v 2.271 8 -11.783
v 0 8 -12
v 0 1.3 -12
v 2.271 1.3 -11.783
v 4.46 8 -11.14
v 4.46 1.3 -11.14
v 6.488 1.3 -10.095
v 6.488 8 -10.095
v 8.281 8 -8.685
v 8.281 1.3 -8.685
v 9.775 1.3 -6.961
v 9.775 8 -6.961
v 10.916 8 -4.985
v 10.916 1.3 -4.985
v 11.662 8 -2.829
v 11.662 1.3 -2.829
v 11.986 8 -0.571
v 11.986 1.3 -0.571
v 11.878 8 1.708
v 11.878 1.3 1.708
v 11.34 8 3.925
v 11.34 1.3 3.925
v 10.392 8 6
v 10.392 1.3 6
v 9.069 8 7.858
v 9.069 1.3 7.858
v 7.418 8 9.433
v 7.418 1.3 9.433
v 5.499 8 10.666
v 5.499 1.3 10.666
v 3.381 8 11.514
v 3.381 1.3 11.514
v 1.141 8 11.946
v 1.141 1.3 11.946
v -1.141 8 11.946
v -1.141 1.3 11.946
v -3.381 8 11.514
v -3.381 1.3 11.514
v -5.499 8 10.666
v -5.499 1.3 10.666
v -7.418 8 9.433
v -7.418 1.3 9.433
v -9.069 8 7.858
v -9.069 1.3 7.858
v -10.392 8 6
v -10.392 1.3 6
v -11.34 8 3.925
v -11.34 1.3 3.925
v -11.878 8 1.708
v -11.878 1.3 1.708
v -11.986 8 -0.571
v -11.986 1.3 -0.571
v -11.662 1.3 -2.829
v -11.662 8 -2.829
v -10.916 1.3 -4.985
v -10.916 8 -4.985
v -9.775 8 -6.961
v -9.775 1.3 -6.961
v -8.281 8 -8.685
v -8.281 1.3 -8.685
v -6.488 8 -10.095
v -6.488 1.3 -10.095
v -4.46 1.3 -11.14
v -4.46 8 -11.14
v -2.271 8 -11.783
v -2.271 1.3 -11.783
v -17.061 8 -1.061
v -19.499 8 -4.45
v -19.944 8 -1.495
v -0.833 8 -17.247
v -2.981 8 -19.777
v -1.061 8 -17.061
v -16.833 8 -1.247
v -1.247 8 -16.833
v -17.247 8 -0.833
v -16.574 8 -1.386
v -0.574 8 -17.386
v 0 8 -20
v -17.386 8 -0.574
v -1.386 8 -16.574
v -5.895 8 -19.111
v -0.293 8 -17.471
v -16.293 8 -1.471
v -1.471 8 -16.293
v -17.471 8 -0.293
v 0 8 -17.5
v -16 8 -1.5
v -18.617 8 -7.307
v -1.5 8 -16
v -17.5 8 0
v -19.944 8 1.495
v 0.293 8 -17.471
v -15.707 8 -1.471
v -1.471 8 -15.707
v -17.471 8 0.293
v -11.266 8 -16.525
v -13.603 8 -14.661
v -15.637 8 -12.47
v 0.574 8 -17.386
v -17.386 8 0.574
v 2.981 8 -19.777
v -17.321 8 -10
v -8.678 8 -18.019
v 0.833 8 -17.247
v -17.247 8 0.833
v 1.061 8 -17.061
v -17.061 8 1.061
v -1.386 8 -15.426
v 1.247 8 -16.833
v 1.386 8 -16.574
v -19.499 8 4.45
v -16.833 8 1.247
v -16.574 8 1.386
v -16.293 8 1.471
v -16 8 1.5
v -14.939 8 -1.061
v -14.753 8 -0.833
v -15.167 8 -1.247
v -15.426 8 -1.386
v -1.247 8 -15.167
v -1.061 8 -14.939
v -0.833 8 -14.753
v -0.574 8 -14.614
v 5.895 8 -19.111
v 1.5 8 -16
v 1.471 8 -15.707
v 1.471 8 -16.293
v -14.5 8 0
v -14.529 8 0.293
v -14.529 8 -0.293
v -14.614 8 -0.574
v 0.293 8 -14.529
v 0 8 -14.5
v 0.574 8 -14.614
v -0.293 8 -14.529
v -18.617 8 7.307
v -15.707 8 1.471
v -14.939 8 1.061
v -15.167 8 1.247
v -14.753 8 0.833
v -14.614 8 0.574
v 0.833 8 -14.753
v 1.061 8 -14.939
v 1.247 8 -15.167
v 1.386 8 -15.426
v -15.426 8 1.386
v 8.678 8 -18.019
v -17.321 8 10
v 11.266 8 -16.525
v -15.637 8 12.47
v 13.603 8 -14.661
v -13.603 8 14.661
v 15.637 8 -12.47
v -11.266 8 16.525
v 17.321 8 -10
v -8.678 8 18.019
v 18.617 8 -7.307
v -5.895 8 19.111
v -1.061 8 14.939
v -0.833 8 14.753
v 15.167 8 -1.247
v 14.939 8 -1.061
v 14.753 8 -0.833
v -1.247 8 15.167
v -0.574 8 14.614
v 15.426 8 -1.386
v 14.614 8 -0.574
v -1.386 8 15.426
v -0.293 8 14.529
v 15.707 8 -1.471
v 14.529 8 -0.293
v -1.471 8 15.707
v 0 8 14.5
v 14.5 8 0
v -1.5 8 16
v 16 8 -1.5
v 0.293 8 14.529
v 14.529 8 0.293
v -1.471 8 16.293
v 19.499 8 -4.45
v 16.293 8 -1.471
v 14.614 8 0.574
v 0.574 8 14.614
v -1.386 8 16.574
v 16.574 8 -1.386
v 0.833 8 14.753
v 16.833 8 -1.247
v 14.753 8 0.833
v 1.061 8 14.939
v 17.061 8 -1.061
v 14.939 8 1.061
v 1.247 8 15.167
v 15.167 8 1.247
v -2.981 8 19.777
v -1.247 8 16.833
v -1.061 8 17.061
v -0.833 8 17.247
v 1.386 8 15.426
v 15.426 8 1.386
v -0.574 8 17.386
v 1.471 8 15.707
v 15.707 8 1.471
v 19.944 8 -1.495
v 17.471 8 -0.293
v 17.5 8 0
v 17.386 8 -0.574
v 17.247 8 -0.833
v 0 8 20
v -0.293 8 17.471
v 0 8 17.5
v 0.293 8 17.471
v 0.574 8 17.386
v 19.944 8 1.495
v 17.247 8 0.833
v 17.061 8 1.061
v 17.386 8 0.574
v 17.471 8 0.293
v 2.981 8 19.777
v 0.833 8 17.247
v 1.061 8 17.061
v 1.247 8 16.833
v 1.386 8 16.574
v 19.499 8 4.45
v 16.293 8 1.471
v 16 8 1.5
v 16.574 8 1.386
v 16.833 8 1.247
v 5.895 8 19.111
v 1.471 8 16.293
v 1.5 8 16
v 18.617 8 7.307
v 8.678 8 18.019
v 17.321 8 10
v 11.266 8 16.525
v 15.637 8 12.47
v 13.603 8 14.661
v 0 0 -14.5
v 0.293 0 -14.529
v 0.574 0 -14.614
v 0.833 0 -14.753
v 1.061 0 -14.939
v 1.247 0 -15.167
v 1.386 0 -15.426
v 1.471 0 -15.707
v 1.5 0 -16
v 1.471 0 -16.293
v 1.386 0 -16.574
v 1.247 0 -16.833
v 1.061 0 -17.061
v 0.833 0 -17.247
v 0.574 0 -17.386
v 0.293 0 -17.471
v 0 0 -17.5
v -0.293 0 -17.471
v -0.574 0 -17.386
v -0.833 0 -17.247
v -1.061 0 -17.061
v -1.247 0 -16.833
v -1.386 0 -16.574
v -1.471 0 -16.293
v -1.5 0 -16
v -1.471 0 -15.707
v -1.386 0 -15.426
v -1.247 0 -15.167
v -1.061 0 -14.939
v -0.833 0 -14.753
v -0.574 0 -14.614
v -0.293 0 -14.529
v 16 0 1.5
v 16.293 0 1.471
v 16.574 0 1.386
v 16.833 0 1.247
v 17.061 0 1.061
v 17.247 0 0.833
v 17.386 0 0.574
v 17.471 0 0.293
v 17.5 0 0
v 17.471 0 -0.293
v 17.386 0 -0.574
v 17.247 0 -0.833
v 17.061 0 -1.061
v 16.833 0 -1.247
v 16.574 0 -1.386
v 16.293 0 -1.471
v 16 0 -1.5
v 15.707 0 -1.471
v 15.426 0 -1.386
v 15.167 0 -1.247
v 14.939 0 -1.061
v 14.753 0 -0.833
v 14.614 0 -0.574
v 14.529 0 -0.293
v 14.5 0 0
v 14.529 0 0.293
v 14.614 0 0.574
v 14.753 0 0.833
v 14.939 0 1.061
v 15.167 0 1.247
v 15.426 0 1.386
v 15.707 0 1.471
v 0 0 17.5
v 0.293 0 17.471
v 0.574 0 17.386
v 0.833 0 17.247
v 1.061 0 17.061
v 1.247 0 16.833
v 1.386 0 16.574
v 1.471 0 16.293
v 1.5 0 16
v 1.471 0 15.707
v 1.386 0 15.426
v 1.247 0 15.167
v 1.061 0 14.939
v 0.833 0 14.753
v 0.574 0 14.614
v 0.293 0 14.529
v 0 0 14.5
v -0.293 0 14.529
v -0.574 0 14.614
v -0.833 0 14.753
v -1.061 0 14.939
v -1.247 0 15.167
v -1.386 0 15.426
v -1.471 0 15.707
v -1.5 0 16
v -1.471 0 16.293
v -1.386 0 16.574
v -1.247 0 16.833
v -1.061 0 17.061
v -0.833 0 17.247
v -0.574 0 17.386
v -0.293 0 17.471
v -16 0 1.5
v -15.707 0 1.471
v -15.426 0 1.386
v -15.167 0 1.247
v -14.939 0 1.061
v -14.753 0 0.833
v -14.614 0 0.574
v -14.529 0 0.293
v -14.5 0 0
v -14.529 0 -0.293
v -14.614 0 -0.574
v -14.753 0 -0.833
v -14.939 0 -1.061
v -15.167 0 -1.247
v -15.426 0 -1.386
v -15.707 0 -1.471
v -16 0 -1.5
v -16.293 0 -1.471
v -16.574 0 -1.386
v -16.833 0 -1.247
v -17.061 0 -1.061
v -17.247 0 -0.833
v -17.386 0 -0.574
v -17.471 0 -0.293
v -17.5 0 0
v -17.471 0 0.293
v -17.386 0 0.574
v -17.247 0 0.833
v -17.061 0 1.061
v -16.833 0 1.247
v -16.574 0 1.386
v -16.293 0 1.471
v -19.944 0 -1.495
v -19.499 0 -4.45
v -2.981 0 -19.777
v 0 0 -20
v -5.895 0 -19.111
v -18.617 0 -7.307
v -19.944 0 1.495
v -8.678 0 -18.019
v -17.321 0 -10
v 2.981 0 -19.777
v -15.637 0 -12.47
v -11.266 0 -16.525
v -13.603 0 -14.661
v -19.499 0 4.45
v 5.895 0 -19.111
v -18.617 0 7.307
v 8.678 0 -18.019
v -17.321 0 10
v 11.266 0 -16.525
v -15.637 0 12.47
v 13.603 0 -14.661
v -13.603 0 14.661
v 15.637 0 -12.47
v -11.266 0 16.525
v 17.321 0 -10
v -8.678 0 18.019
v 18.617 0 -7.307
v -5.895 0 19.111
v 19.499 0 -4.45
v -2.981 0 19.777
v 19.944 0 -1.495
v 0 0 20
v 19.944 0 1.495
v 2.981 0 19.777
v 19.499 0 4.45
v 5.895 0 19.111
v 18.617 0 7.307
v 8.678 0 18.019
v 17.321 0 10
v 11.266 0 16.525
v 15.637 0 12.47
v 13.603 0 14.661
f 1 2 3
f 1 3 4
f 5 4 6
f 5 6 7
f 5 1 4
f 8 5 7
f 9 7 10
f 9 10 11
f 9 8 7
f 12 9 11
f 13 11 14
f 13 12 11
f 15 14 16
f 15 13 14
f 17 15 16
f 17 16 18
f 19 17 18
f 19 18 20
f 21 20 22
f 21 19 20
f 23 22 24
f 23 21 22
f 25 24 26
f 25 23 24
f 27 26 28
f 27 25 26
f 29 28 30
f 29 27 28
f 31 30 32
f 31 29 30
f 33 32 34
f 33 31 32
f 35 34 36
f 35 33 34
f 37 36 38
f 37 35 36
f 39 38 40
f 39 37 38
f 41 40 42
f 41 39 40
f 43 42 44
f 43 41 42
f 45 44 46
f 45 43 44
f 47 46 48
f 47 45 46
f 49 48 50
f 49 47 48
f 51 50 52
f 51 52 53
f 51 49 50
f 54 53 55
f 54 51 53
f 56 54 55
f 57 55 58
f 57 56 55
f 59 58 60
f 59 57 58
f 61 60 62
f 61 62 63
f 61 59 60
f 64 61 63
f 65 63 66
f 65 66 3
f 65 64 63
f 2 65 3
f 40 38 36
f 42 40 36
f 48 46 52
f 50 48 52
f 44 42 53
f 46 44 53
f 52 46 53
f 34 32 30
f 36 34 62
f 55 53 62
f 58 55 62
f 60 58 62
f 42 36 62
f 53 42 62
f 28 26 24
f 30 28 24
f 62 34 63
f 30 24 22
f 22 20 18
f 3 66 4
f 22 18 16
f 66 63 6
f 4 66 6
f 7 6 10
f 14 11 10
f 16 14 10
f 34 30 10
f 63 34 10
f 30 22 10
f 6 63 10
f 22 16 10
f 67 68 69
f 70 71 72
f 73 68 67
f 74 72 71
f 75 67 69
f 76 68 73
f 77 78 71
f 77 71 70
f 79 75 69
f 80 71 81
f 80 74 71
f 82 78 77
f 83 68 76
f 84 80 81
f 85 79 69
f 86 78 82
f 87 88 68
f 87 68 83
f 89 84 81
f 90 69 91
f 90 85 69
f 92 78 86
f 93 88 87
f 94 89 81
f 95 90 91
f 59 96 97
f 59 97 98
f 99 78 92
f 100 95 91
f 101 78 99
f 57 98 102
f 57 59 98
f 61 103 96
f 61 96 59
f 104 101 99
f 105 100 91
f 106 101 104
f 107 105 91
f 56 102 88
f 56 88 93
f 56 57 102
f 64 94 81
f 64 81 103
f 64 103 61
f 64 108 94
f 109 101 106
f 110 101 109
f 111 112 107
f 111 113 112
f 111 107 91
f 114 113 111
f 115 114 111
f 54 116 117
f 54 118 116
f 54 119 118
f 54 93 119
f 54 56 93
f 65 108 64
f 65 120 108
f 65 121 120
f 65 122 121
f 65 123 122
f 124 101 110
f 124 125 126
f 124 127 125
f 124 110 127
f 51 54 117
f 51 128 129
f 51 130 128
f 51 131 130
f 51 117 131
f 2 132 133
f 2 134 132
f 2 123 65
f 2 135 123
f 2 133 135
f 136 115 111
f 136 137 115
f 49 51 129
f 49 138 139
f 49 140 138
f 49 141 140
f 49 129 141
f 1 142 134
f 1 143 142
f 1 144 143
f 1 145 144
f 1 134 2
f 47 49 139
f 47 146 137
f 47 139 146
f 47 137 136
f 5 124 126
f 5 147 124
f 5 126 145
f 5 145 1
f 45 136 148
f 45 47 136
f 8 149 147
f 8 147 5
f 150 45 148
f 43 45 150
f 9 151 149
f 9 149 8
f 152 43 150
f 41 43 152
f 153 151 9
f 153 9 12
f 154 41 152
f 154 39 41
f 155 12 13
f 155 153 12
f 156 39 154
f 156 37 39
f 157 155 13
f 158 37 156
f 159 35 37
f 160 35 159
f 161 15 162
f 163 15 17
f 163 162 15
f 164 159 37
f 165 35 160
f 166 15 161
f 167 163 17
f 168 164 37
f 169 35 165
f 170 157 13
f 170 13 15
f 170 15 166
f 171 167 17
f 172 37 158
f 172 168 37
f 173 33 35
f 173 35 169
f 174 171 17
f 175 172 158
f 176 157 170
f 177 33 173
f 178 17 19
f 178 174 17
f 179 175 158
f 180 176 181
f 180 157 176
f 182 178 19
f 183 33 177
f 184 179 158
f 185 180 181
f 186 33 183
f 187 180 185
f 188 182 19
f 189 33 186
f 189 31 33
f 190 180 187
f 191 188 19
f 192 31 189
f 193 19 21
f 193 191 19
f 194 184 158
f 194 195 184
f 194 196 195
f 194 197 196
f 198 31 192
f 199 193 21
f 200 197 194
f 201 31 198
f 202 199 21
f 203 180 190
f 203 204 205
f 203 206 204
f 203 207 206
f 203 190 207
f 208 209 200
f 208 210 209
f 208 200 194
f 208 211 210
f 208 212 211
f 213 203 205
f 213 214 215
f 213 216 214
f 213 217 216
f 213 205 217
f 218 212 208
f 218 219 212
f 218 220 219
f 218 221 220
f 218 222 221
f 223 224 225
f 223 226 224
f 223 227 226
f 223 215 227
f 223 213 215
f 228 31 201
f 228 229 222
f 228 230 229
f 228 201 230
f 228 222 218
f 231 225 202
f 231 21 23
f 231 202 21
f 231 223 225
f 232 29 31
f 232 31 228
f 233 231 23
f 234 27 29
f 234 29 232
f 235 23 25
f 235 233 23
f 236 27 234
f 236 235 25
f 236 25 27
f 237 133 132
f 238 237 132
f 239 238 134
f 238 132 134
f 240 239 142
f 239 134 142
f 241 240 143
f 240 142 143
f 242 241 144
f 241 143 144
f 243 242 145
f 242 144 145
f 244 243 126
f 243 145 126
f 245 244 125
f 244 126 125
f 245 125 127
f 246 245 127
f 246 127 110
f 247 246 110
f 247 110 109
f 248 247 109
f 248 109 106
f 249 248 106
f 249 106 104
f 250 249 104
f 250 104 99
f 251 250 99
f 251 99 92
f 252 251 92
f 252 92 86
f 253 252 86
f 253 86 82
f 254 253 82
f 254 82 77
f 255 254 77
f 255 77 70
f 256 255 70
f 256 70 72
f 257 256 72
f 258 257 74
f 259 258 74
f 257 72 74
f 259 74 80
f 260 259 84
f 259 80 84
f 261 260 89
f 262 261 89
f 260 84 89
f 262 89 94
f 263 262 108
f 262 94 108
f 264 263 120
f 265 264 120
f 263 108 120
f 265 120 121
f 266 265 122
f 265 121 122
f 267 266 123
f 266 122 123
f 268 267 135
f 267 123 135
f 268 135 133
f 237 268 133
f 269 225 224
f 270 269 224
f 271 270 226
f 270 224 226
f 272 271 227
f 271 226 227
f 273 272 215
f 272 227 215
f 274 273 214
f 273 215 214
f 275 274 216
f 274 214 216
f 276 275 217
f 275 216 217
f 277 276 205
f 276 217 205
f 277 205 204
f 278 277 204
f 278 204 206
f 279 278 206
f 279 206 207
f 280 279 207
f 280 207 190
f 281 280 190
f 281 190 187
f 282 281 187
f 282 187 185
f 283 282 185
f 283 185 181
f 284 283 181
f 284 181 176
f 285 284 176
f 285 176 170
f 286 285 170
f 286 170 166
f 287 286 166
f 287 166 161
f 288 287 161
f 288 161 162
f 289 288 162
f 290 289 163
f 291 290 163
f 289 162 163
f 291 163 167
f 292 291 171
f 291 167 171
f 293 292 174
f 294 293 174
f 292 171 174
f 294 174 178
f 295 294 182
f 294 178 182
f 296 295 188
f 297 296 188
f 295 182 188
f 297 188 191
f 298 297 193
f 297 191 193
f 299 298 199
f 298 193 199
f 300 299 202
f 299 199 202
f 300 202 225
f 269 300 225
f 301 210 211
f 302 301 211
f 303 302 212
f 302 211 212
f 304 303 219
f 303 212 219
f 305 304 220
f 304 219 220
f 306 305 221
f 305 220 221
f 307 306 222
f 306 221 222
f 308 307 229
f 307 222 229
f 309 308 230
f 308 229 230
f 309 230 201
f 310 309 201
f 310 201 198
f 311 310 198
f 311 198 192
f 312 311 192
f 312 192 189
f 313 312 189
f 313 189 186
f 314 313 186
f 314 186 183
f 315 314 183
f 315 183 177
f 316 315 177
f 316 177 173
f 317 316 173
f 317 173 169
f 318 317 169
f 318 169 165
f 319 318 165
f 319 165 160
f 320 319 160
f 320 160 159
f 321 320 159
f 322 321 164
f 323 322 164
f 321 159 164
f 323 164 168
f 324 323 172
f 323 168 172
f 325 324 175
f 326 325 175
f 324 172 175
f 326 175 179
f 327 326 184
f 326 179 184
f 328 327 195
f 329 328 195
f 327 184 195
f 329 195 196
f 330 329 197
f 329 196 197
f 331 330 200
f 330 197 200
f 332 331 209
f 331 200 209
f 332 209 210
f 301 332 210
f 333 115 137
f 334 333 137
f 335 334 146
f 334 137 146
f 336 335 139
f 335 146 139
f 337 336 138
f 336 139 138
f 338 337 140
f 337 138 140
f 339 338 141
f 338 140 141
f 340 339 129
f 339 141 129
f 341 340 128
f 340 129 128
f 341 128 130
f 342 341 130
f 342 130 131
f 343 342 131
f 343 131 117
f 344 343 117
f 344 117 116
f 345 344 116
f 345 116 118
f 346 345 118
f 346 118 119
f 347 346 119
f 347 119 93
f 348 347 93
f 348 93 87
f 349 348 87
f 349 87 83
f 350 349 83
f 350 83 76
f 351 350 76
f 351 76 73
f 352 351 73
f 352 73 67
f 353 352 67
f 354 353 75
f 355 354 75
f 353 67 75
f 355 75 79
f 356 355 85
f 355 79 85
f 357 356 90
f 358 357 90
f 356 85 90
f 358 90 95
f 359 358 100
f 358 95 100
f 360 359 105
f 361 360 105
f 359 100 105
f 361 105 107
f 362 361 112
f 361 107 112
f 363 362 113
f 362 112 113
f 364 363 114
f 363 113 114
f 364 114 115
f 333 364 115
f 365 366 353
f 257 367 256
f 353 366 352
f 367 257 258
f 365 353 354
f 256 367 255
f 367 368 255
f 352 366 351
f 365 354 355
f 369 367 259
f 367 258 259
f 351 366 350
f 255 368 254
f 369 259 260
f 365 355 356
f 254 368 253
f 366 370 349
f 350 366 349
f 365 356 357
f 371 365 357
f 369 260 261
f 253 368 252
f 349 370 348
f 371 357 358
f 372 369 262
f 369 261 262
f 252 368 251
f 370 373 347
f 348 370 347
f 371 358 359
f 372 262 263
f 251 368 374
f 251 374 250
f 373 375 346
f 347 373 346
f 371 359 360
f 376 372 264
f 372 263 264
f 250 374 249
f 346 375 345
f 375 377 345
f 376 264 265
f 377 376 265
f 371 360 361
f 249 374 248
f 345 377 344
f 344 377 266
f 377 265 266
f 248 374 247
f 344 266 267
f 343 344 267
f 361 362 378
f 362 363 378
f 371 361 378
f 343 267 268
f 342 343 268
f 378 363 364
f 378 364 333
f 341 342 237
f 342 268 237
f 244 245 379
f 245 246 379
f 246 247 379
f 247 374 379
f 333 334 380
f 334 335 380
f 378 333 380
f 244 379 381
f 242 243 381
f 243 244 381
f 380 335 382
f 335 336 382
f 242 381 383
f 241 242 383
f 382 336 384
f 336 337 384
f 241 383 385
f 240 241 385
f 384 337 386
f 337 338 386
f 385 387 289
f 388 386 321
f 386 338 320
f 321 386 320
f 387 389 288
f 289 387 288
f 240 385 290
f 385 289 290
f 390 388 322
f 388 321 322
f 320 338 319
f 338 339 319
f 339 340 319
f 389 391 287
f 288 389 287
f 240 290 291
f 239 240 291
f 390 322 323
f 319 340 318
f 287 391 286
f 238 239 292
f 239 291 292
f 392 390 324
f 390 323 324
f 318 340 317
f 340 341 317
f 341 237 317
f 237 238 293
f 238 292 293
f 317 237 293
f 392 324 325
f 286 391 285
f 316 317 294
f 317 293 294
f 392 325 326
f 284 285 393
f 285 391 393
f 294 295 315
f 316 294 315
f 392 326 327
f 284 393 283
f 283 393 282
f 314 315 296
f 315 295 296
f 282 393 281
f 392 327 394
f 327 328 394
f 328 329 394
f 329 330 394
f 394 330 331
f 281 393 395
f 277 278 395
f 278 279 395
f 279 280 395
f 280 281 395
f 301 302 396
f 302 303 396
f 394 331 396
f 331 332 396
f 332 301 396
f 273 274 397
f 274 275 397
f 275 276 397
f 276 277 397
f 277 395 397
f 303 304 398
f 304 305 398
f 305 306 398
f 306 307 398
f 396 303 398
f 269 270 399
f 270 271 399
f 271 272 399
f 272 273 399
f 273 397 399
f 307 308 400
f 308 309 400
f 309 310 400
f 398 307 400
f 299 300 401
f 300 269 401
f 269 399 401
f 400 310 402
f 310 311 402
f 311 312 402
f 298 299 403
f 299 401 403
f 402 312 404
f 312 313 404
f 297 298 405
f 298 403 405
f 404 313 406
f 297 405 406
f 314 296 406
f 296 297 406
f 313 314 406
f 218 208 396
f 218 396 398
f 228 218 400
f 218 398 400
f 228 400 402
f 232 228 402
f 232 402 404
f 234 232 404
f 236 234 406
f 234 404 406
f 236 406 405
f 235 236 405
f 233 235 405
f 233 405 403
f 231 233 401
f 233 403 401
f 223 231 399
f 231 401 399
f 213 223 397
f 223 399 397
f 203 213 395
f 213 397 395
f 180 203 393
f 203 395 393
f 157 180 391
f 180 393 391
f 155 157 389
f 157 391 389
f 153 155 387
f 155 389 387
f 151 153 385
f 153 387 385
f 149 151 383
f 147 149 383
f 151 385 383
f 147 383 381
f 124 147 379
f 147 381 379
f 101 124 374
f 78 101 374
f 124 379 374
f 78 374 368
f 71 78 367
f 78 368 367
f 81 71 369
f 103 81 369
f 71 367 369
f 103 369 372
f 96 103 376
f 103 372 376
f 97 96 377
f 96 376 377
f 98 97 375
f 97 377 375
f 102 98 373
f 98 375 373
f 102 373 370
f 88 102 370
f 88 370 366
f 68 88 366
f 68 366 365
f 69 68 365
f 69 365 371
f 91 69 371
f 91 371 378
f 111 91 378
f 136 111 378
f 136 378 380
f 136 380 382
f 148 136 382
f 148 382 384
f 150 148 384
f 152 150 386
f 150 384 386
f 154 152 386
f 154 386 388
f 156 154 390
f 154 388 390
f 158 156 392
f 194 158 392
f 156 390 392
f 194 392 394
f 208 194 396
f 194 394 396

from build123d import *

# Parameters (mm, degrees)
SKETCH2_R           = 20
BOSS_EXTRUDE1_DEPTH = 8
SKETCH3_R           = 1.5
CUT_EXTRUDE1_DEPTH  = 30.393876913
SKETCH4_R           = 12
CUT_EXTRUDE2_DEPTH  = 6.7


with BuildPart() as part:
    # Sketch2 → Boss-Extrude1 (new body)
    with BuildSketch(Plane(origin=(0, 0, 0), x_dir=(1, 0, 0), z_dir=(0, 1, 0))):
        with Locations(Location((0, 0, 0), (0, 0, 270))):
            Circle(SKETCH2_R)
    extrude(amount=BOSS_EXTRUDE1_DEPTH)

    # Sketch3 → Cut-Extrude1 (cut, through all)
    with BuildSketch(Plane(origin=(0, 8, 0), x_dir=(1, 0, 0), z_dir=(0, 1, 0))):
        with Locations(Location((0, 16, 0), (0, 0, 270))):
            Circle(SKETCH3_R)
        with Locations(Location((-16, 0, 0), (0, 0, 270))):
            Circle(SKETCH3_R)
        with Locations(Location((16, 0, 0), (0, 0, 270))):
            Circle(SKETCH3_R)
        with Locations(Location((0, -16, 0), (0, 0, 270))):
            Circle(SKETCH3_R)
    extrude(amount=-CUT_EXTRUDE1_DEPTH, mode=Mode.SUBTRACT)

    # Sketch4 → Cut-Extrude2 (cut)
    with BuildSketch(Plane(origin=(0, 8, -8), x_dir=(1, 0, 0), z_dir=(0, -1, 0))):
        with Locations(Location((0, 8, 0), (0, 0, 270))):
            Circle(SKETCH4_R)
    extrude(amount=CUT_EXTRUDE2_DEPTH, mode=Mode.SUBTRACT)


solid = part.part
